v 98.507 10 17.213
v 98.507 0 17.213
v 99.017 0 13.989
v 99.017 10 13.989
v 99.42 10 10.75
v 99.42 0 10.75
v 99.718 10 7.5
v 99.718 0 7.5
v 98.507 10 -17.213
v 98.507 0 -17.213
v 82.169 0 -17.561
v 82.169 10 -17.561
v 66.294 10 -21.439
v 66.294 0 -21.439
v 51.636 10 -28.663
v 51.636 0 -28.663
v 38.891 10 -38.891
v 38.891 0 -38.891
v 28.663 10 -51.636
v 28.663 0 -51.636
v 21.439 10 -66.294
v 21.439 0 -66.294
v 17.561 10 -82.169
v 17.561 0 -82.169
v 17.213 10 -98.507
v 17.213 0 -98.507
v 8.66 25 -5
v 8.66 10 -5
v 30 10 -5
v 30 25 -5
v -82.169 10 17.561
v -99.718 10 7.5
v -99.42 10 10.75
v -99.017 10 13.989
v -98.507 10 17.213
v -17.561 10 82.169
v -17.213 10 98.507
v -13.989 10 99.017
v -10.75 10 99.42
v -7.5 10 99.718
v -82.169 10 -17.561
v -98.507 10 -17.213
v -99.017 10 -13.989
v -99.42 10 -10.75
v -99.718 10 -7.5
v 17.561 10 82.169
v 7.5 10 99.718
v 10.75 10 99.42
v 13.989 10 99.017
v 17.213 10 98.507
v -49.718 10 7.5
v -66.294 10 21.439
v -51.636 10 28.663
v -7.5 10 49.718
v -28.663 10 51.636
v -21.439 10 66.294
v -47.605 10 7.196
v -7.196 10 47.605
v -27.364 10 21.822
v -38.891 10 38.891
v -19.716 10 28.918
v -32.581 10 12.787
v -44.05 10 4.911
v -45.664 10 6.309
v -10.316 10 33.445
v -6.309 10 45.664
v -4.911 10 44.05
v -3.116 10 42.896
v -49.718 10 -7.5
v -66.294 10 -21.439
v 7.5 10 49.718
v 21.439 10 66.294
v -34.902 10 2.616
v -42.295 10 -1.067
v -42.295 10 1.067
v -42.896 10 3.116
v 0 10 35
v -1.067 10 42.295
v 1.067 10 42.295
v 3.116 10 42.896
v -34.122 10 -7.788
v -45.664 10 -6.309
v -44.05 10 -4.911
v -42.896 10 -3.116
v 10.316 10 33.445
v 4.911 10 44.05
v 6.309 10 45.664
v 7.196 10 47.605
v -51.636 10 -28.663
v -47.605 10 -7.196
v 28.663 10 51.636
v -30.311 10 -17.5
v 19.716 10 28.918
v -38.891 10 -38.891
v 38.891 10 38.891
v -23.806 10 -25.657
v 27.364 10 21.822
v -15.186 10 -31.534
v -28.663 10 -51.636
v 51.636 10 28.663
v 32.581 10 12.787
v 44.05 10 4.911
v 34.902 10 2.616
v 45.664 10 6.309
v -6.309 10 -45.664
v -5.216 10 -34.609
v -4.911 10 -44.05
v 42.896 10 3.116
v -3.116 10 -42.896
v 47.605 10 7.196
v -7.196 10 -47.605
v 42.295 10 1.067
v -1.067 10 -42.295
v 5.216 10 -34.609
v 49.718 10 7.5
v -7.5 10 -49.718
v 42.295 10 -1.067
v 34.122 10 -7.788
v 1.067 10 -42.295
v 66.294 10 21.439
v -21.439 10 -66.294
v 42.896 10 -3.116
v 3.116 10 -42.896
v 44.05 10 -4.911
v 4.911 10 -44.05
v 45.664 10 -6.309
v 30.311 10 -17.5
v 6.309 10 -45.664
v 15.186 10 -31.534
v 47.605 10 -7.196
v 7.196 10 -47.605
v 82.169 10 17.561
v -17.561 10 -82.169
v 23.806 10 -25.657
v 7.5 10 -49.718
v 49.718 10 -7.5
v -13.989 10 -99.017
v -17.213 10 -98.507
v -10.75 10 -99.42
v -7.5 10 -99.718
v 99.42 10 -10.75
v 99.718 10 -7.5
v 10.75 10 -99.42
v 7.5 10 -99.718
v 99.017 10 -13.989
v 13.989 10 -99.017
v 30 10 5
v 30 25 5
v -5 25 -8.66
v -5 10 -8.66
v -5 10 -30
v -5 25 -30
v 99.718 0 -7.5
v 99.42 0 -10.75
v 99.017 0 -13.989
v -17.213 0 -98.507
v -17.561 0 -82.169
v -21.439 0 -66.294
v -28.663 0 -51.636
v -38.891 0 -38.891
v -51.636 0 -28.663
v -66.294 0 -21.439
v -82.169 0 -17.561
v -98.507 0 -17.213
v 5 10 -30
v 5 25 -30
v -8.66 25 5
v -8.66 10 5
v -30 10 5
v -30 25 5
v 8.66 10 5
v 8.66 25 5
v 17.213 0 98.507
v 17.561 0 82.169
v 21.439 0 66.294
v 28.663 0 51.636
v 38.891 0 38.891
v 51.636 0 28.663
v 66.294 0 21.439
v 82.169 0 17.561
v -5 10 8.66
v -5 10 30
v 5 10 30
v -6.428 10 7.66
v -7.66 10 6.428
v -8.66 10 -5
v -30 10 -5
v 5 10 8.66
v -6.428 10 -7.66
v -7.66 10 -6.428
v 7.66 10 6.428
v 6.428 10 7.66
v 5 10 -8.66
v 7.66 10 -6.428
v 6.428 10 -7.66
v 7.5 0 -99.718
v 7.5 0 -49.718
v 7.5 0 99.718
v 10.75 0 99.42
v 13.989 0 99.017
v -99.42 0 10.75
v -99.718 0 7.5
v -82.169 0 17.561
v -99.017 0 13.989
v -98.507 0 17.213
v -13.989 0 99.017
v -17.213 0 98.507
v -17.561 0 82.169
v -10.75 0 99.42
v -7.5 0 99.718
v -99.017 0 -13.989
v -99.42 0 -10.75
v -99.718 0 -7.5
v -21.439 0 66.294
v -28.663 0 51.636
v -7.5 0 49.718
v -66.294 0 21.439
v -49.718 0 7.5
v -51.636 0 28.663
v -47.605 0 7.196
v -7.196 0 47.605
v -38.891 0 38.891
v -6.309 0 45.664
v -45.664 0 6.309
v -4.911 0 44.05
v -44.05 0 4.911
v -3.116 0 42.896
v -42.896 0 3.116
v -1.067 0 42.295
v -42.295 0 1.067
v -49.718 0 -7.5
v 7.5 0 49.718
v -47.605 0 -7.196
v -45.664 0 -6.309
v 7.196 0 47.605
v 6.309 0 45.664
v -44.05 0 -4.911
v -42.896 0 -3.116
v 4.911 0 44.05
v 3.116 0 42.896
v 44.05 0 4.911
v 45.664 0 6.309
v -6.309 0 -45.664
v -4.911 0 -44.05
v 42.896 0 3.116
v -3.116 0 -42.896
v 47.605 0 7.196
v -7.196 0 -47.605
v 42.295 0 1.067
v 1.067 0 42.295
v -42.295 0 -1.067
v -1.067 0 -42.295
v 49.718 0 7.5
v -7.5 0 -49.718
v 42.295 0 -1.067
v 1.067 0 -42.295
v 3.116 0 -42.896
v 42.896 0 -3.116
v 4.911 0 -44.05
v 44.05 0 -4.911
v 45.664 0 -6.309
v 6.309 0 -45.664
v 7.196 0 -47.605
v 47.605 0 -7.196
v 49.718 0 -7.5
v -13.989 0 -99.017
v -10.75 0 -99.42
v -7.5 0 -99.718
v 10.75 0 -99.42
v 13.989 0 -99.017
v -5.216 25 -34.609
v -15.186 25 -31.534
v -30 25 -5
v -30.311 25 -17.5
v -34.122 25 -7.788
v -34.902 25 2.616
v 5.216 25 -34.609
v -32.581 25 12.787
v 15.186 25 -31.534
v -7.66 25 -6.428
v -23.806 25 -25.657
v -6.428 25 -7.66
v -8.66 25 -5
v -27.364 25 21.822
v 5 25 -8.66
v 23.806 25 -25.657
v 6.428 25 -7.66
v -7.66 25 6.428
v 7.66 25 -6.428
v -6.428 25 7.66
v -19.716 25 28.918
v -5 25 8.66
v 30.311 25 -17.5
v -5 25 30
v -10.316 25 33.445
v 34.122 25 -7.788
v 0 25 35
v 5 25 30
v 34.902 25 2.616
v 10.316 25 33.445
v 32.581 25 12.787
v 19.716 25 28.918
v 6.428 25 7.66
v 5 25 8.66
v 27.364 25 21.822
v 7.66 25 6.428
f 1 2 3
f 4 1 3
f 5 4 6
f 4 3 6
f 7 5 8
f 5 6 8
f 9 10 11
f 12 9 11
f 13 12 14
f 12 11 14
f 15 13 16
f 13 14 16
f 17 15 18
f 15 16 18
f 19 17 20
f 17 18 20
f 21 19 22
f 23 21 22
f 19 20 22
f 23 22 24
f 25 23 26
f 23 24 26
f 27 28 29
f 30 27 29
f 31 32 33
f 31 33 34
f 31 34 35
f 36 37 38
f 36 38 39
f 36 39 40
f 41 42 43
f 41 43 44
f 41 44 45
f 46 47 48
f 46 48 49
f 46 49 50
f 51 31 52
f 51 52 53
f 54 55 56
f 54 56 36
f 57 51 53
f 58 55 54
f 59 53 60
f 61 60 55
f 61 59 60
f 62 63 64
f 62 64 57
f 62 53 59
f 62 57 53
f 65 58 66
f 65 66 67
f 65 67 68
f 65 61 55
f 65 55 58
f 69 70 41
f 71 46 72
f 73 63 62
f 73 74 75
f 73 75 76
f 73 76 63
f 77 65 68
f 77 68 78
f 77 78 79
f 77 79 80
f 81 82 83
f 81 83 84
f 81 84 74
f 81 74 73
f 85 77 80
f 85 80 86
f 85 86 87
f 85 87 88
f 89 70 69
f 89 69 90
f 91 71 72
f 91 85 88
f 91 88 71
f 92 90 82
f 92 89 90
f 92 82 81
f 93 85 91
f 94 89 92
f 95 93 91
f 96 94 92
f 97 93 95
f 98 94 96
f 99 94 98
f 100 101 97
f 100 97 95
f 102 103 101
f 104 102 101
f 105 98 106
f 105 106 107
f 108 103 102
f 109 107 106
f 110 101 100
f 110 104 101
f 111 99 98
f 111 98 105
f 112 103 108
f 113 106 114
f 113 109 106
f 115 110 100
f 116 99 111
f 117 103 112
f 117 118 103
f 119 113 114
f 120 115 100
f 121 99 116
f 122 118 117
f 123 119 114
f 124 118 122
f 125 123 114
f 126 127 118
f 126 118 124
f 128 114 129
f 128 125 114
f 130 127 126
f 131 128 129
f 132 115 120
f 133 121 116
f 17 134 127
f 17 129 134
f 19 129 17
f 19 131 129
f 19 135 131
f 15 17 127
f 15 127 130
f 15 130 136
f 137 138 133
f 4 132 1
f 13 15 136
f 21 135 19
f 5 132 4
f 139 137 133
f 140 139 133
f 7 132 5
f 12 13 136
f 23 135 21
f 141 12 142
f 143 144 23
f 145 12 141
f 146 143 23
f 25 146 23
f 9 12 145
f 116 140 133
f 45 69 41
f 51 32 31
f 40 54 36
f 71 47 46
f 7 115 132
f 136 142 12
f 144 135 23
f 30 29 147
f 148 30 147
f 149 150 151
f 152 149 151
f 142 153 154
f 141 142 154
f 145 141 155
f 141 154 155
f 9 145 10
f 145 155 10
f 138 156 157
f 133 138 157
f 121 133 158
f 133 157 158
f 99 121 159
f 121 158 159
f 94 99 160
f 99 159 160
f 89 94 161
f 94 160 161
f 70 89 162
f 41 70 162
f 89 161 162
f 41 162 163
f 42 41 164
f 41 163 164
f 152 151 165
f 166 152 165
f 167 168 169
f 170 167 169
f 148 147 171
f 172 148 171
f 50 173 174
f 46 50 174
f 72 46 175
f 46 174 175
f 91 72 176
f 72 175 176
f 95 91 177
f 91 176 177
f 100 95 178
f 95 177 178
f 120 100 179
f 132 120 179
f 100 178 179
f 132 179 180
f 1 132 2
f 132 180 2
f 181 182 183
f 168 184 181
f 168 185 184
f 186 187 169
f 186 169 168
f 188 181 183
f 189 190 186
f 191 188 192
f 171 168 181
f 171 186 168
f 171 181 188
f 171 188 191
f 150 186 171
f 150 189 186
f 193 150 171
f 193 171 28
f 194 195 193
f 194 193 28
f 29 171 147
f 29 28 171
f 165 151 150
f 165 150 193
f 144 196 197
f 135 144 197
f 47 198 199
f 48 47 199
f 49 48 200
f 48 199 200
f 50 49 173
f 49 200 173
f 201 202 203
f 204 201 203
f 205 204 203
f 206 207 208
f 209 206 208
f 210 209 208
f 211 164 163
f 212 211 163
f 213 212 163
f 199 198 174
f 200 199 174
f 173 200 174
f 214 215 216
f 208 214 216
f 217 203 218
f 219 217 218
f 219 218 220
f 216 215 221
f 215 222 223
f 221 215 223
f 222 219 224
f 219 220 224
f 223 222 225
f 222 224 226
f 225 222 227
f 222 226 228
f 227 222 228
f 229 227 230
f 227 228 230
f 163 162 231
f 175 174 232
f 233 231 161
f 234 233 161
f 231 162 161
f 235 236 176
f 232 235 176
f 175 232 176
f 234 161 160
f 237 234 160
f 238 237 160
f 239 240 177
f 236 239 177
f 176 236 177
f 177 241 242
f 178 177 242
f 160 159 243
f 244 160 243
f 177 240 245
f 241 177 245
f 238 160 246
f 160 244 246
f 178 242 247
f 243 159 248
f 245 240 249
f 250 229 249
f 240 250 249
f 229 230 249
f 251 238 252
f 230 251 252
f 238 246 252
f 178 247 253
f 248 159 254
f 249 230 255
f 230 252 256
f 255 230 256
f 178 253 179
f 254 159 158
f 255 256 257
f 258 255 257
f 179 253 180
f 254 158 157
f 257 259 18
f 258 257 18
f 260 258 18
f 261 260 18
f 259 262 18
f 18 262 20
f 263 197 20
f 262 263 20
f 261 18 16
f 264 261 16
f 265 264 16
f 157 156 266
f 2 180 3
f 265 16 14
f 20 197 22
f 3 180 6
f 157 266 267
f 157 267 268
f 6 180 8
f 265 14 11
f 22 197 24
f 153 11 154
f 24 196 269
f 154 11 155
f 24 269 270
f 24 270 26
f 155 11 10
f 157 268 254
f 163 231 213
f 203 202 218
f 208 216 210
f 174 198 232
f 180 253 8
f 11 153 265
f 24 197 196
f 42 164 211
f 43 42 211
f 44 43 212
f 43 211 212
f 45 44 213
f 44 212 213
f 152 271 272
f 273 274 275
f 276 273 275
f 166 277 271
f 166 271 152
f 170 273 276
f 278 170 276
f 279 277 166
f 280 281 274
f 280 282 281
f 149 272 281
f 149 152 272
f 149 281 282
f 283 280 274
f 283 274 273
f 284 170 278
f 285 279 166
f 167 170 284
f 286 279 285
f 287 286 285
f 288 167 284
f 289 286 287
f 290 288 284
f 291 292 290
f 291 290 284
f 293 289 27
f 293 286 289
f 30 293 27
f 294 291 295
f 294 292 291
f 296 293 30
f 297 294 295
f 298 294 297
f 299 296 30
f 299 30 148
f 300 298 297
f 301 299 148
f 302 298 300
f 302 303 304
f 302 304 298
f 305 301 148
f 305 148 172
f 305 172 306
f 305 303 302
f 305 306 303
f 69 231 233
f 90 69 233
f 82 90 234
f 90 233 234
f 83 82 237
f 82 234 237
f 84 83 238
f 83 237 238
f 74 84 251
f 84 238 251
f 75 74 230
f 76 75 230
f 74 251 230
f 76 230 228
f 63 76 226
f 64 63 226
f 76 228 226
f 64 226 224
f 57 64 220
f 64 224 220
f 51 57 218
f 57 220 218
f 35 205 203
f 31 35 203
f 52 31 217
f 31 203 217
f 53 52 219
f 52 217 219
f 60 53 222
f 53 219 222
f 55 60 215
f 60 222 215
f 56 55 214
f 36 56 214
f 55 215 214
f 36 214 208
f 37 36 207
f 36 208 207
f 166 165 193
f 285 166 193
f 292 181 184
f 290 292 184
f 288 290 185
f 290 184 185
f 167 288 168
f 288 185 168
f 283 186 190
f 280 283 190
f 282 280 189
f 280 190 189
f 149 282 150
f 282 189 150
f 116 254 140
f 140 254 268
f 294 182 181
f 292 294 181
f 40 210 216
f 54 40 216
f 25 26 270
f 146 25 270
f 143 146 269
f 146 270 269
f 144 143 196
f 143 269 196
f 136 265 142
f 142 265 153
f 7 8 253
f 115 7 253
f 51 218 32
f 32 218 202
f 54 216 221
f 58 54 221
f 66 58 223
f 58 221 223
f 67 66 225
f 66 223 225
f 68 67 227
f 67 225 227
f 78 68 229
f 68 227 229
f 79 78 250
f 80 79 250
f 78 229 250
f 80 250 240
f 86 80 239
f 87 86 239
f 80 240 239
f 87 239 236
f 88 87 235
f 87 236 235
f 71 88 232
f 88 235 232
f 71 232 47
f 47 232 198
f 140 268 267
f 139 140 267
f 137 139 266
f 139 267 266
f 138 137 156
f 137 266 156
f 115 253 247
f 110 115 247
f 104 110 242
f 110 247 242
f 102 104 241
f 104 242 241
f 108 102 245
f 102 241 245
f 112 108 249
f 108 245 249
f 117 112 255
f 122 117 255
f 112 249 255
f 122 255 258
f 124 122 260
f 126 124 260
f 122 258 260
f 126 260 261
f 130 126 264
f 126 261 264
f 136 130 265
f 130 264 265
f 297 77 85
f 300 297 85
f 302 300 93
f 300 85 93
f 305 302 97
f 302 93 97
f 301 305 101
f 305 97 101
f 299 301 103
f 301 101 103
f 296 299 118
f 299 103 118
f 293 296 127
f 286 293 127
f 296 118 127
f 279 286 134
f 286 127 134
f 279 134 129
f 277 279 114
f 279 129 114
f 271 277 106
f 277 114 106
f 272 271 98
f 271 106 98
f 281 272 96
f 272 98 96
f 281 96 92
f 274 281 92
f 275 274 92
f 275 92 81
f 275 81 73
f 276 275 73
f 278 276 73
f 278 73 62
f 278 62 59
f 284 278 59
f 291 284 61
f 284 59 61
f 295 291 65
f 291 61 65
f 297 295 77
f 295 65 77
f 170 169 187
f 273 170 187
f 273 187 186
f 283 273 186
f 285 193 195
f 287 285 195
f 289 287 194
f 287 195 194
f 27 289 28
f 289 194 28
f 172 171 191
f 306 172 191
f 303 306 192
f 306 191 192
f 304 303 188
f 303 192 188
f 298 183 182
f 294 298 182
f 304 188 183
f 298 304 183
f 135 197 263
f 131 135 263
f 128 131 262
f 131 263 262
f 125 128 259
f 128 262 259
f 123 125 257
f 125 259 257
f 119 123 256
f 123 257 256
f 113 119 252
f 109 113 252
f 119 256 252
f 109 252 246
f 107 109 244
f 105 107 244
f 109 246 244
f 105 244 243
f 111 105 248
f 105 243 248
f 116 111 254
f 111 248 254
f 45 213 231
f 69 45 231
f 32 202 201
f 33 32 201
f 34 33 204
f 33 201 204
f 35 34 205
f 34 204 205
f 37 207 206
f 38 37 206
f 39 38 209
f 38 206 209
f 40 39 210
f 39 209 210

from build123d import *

# Parameters (mm, degrees)
BOSS_EXTRUDE3_DEPTH = 10
SKETCH2_R           = 35
BOSS_EXTRUDE4_DEPTH = 15


with BuildPart() as part:
    # Sketch1 → Boss-Extrude3 (new body)
    with BuildSketch(Plane(origin=(0, 0, 0), x_dir=(1, 0, 0), z_dir=(0, 1, 0))):
        with BuildLine():
            Line((-7.5, 49.718353376), (-7.5, 99.718353376))
            ThreePointArc((-7.5, 99.718353376), (-12.371520282, 99.231776594), (-17.213387926, 98.507356457))
            ThreePointArc((-17.213387926, 98.507356457), (-38.890872965, 38.890872965), (-98.507356457, 17.213387926))
            ThreePointArc((-98.507356457, 17.213387926), (-99.231776594, 12.371520282), (-99.718353376, 7.5))
            Line((-99.718353376, 7.5), (-49.718353376, 7.5))
            ThreePointArc((-49.718353376, 7.5), (-42.218353376, 0), (-49.718353376, -7.5))
            Line((-49.718353376, -7.5), (-99.718353376, -7.5))
            ThreePointArc((-99.718353376, -7.5), (-99.231776594, -12.371520282), (-98.507356457, -17.213387926))
            ThreePointArc((-98.507356457, -17.213387926), (-38.890872965, -38.890872965), (-17.213387926, -98.507356457))
            ThreePointArc((-17.213387926, -98.507356457), (-12.371520282, -99.231776594), (-7.5, -99.718353376))
            Line((-7.5, -99.718353376), (-7.5, -49.718353376))
            ThreePointArc((-7.5, -49.718353376), (0, -42.218353376), (7.5, -49.718353376))
            Line((7.5, -49.718353376), (7.5, -99.718353376))
            ThreePointArc((7.5, -99.718353376), (12.371520282, -99.231776594), (17.213387926, -98.507356457))
            ThreePointArc((17.213387926, -98.507356457), (38.890872965, -38.890872965), (98.507356457, -17.213387926))
            ThreePointArc((98.507356457, -17.213387926), (99.231776594, -12.371520282), (99.718353376, -7.5))
            Line((99.718353376, -7.5), (49.718353376, -7.5))
            ThreePointArc((49.718353376, -7.5), (42.218353376, 0), (49.718353376, 7.5))
            Line((49.718353376, 7.5), (99.718353376, 7.5))
            ThreePointArc((99.718353376, 7.5), (99.231776594, 12.371520282), (98.507356457, 17.213387926))
            ThreePointArc((98.507356457, 17.213387926), (38.890872965, 38.890872965), (17.213387926, 98.507356457))
            ThreePointArc((17.213387926, 98.507356457), (12.371520282, 99.231776594), (7.5, 99.718353376))
            Line((7.5, 99.718353376), (7.5, 49.718353376))
            ThreePointArc((7.5, 49.718353376), (0, 42.218353376), (-7.5, 49.718353376))
        make_face()
    extrude(amount=BOSS_EXTRUDE3_DEPTH)

    # Sketch2 → Boss-Extrude4 (add)
    with BuildSketch(Plane(origin=(0, 10, 0), x_dir=(1, 0, 0), z_dir=(0, 1, 0))):
        with Locations(Location((0, 0, 0), (0, 0, 270))):
            Circle(SKETCH2_R)
        with BuildLine():
            Line((-5, 8.660254038), (-5, 30))
            Line((-5, 30), (5, 30))
            Line((5, 30), (5, 8.660254038))
            ThreePointArc((5, 8.660254038), (7.071067812, 7.071067812), (8.660254038, 5))
            Line((8.660254038, 5), (30, 5))
            Line((30, 5), (30, -5))
            Line((30, -5), (8.660254038, -5))
            ThreePointArc((8.660254038, -5), (7.071067812, -7.071067812), (5, -8.660254038))
            Line((5, -8.660254038), (5, -30))
            Line((5, -30), (-5, -30))
            Line((-5, -30), (-5, -8.660254038))
            ThreePointArc((-5, -8.660254038), (-7.071067812, -7.071067812), (-8.660254038, -5))
            Line((-8.660254038, -5), (-30, -5))
            Line((-30, -5), (-30, 5))
            Line((-30, 5), (-8.660254038, 5))
            ThreePointArc((-8.660254038, 5), (-7.071067812, 7.071067812), (-5, 8.660254038))
        make_face(mode=Mode.SUBTRACT)
    extrude(amount=BOSS_EXTRUDE4_DEPTH)


solid = part.part
